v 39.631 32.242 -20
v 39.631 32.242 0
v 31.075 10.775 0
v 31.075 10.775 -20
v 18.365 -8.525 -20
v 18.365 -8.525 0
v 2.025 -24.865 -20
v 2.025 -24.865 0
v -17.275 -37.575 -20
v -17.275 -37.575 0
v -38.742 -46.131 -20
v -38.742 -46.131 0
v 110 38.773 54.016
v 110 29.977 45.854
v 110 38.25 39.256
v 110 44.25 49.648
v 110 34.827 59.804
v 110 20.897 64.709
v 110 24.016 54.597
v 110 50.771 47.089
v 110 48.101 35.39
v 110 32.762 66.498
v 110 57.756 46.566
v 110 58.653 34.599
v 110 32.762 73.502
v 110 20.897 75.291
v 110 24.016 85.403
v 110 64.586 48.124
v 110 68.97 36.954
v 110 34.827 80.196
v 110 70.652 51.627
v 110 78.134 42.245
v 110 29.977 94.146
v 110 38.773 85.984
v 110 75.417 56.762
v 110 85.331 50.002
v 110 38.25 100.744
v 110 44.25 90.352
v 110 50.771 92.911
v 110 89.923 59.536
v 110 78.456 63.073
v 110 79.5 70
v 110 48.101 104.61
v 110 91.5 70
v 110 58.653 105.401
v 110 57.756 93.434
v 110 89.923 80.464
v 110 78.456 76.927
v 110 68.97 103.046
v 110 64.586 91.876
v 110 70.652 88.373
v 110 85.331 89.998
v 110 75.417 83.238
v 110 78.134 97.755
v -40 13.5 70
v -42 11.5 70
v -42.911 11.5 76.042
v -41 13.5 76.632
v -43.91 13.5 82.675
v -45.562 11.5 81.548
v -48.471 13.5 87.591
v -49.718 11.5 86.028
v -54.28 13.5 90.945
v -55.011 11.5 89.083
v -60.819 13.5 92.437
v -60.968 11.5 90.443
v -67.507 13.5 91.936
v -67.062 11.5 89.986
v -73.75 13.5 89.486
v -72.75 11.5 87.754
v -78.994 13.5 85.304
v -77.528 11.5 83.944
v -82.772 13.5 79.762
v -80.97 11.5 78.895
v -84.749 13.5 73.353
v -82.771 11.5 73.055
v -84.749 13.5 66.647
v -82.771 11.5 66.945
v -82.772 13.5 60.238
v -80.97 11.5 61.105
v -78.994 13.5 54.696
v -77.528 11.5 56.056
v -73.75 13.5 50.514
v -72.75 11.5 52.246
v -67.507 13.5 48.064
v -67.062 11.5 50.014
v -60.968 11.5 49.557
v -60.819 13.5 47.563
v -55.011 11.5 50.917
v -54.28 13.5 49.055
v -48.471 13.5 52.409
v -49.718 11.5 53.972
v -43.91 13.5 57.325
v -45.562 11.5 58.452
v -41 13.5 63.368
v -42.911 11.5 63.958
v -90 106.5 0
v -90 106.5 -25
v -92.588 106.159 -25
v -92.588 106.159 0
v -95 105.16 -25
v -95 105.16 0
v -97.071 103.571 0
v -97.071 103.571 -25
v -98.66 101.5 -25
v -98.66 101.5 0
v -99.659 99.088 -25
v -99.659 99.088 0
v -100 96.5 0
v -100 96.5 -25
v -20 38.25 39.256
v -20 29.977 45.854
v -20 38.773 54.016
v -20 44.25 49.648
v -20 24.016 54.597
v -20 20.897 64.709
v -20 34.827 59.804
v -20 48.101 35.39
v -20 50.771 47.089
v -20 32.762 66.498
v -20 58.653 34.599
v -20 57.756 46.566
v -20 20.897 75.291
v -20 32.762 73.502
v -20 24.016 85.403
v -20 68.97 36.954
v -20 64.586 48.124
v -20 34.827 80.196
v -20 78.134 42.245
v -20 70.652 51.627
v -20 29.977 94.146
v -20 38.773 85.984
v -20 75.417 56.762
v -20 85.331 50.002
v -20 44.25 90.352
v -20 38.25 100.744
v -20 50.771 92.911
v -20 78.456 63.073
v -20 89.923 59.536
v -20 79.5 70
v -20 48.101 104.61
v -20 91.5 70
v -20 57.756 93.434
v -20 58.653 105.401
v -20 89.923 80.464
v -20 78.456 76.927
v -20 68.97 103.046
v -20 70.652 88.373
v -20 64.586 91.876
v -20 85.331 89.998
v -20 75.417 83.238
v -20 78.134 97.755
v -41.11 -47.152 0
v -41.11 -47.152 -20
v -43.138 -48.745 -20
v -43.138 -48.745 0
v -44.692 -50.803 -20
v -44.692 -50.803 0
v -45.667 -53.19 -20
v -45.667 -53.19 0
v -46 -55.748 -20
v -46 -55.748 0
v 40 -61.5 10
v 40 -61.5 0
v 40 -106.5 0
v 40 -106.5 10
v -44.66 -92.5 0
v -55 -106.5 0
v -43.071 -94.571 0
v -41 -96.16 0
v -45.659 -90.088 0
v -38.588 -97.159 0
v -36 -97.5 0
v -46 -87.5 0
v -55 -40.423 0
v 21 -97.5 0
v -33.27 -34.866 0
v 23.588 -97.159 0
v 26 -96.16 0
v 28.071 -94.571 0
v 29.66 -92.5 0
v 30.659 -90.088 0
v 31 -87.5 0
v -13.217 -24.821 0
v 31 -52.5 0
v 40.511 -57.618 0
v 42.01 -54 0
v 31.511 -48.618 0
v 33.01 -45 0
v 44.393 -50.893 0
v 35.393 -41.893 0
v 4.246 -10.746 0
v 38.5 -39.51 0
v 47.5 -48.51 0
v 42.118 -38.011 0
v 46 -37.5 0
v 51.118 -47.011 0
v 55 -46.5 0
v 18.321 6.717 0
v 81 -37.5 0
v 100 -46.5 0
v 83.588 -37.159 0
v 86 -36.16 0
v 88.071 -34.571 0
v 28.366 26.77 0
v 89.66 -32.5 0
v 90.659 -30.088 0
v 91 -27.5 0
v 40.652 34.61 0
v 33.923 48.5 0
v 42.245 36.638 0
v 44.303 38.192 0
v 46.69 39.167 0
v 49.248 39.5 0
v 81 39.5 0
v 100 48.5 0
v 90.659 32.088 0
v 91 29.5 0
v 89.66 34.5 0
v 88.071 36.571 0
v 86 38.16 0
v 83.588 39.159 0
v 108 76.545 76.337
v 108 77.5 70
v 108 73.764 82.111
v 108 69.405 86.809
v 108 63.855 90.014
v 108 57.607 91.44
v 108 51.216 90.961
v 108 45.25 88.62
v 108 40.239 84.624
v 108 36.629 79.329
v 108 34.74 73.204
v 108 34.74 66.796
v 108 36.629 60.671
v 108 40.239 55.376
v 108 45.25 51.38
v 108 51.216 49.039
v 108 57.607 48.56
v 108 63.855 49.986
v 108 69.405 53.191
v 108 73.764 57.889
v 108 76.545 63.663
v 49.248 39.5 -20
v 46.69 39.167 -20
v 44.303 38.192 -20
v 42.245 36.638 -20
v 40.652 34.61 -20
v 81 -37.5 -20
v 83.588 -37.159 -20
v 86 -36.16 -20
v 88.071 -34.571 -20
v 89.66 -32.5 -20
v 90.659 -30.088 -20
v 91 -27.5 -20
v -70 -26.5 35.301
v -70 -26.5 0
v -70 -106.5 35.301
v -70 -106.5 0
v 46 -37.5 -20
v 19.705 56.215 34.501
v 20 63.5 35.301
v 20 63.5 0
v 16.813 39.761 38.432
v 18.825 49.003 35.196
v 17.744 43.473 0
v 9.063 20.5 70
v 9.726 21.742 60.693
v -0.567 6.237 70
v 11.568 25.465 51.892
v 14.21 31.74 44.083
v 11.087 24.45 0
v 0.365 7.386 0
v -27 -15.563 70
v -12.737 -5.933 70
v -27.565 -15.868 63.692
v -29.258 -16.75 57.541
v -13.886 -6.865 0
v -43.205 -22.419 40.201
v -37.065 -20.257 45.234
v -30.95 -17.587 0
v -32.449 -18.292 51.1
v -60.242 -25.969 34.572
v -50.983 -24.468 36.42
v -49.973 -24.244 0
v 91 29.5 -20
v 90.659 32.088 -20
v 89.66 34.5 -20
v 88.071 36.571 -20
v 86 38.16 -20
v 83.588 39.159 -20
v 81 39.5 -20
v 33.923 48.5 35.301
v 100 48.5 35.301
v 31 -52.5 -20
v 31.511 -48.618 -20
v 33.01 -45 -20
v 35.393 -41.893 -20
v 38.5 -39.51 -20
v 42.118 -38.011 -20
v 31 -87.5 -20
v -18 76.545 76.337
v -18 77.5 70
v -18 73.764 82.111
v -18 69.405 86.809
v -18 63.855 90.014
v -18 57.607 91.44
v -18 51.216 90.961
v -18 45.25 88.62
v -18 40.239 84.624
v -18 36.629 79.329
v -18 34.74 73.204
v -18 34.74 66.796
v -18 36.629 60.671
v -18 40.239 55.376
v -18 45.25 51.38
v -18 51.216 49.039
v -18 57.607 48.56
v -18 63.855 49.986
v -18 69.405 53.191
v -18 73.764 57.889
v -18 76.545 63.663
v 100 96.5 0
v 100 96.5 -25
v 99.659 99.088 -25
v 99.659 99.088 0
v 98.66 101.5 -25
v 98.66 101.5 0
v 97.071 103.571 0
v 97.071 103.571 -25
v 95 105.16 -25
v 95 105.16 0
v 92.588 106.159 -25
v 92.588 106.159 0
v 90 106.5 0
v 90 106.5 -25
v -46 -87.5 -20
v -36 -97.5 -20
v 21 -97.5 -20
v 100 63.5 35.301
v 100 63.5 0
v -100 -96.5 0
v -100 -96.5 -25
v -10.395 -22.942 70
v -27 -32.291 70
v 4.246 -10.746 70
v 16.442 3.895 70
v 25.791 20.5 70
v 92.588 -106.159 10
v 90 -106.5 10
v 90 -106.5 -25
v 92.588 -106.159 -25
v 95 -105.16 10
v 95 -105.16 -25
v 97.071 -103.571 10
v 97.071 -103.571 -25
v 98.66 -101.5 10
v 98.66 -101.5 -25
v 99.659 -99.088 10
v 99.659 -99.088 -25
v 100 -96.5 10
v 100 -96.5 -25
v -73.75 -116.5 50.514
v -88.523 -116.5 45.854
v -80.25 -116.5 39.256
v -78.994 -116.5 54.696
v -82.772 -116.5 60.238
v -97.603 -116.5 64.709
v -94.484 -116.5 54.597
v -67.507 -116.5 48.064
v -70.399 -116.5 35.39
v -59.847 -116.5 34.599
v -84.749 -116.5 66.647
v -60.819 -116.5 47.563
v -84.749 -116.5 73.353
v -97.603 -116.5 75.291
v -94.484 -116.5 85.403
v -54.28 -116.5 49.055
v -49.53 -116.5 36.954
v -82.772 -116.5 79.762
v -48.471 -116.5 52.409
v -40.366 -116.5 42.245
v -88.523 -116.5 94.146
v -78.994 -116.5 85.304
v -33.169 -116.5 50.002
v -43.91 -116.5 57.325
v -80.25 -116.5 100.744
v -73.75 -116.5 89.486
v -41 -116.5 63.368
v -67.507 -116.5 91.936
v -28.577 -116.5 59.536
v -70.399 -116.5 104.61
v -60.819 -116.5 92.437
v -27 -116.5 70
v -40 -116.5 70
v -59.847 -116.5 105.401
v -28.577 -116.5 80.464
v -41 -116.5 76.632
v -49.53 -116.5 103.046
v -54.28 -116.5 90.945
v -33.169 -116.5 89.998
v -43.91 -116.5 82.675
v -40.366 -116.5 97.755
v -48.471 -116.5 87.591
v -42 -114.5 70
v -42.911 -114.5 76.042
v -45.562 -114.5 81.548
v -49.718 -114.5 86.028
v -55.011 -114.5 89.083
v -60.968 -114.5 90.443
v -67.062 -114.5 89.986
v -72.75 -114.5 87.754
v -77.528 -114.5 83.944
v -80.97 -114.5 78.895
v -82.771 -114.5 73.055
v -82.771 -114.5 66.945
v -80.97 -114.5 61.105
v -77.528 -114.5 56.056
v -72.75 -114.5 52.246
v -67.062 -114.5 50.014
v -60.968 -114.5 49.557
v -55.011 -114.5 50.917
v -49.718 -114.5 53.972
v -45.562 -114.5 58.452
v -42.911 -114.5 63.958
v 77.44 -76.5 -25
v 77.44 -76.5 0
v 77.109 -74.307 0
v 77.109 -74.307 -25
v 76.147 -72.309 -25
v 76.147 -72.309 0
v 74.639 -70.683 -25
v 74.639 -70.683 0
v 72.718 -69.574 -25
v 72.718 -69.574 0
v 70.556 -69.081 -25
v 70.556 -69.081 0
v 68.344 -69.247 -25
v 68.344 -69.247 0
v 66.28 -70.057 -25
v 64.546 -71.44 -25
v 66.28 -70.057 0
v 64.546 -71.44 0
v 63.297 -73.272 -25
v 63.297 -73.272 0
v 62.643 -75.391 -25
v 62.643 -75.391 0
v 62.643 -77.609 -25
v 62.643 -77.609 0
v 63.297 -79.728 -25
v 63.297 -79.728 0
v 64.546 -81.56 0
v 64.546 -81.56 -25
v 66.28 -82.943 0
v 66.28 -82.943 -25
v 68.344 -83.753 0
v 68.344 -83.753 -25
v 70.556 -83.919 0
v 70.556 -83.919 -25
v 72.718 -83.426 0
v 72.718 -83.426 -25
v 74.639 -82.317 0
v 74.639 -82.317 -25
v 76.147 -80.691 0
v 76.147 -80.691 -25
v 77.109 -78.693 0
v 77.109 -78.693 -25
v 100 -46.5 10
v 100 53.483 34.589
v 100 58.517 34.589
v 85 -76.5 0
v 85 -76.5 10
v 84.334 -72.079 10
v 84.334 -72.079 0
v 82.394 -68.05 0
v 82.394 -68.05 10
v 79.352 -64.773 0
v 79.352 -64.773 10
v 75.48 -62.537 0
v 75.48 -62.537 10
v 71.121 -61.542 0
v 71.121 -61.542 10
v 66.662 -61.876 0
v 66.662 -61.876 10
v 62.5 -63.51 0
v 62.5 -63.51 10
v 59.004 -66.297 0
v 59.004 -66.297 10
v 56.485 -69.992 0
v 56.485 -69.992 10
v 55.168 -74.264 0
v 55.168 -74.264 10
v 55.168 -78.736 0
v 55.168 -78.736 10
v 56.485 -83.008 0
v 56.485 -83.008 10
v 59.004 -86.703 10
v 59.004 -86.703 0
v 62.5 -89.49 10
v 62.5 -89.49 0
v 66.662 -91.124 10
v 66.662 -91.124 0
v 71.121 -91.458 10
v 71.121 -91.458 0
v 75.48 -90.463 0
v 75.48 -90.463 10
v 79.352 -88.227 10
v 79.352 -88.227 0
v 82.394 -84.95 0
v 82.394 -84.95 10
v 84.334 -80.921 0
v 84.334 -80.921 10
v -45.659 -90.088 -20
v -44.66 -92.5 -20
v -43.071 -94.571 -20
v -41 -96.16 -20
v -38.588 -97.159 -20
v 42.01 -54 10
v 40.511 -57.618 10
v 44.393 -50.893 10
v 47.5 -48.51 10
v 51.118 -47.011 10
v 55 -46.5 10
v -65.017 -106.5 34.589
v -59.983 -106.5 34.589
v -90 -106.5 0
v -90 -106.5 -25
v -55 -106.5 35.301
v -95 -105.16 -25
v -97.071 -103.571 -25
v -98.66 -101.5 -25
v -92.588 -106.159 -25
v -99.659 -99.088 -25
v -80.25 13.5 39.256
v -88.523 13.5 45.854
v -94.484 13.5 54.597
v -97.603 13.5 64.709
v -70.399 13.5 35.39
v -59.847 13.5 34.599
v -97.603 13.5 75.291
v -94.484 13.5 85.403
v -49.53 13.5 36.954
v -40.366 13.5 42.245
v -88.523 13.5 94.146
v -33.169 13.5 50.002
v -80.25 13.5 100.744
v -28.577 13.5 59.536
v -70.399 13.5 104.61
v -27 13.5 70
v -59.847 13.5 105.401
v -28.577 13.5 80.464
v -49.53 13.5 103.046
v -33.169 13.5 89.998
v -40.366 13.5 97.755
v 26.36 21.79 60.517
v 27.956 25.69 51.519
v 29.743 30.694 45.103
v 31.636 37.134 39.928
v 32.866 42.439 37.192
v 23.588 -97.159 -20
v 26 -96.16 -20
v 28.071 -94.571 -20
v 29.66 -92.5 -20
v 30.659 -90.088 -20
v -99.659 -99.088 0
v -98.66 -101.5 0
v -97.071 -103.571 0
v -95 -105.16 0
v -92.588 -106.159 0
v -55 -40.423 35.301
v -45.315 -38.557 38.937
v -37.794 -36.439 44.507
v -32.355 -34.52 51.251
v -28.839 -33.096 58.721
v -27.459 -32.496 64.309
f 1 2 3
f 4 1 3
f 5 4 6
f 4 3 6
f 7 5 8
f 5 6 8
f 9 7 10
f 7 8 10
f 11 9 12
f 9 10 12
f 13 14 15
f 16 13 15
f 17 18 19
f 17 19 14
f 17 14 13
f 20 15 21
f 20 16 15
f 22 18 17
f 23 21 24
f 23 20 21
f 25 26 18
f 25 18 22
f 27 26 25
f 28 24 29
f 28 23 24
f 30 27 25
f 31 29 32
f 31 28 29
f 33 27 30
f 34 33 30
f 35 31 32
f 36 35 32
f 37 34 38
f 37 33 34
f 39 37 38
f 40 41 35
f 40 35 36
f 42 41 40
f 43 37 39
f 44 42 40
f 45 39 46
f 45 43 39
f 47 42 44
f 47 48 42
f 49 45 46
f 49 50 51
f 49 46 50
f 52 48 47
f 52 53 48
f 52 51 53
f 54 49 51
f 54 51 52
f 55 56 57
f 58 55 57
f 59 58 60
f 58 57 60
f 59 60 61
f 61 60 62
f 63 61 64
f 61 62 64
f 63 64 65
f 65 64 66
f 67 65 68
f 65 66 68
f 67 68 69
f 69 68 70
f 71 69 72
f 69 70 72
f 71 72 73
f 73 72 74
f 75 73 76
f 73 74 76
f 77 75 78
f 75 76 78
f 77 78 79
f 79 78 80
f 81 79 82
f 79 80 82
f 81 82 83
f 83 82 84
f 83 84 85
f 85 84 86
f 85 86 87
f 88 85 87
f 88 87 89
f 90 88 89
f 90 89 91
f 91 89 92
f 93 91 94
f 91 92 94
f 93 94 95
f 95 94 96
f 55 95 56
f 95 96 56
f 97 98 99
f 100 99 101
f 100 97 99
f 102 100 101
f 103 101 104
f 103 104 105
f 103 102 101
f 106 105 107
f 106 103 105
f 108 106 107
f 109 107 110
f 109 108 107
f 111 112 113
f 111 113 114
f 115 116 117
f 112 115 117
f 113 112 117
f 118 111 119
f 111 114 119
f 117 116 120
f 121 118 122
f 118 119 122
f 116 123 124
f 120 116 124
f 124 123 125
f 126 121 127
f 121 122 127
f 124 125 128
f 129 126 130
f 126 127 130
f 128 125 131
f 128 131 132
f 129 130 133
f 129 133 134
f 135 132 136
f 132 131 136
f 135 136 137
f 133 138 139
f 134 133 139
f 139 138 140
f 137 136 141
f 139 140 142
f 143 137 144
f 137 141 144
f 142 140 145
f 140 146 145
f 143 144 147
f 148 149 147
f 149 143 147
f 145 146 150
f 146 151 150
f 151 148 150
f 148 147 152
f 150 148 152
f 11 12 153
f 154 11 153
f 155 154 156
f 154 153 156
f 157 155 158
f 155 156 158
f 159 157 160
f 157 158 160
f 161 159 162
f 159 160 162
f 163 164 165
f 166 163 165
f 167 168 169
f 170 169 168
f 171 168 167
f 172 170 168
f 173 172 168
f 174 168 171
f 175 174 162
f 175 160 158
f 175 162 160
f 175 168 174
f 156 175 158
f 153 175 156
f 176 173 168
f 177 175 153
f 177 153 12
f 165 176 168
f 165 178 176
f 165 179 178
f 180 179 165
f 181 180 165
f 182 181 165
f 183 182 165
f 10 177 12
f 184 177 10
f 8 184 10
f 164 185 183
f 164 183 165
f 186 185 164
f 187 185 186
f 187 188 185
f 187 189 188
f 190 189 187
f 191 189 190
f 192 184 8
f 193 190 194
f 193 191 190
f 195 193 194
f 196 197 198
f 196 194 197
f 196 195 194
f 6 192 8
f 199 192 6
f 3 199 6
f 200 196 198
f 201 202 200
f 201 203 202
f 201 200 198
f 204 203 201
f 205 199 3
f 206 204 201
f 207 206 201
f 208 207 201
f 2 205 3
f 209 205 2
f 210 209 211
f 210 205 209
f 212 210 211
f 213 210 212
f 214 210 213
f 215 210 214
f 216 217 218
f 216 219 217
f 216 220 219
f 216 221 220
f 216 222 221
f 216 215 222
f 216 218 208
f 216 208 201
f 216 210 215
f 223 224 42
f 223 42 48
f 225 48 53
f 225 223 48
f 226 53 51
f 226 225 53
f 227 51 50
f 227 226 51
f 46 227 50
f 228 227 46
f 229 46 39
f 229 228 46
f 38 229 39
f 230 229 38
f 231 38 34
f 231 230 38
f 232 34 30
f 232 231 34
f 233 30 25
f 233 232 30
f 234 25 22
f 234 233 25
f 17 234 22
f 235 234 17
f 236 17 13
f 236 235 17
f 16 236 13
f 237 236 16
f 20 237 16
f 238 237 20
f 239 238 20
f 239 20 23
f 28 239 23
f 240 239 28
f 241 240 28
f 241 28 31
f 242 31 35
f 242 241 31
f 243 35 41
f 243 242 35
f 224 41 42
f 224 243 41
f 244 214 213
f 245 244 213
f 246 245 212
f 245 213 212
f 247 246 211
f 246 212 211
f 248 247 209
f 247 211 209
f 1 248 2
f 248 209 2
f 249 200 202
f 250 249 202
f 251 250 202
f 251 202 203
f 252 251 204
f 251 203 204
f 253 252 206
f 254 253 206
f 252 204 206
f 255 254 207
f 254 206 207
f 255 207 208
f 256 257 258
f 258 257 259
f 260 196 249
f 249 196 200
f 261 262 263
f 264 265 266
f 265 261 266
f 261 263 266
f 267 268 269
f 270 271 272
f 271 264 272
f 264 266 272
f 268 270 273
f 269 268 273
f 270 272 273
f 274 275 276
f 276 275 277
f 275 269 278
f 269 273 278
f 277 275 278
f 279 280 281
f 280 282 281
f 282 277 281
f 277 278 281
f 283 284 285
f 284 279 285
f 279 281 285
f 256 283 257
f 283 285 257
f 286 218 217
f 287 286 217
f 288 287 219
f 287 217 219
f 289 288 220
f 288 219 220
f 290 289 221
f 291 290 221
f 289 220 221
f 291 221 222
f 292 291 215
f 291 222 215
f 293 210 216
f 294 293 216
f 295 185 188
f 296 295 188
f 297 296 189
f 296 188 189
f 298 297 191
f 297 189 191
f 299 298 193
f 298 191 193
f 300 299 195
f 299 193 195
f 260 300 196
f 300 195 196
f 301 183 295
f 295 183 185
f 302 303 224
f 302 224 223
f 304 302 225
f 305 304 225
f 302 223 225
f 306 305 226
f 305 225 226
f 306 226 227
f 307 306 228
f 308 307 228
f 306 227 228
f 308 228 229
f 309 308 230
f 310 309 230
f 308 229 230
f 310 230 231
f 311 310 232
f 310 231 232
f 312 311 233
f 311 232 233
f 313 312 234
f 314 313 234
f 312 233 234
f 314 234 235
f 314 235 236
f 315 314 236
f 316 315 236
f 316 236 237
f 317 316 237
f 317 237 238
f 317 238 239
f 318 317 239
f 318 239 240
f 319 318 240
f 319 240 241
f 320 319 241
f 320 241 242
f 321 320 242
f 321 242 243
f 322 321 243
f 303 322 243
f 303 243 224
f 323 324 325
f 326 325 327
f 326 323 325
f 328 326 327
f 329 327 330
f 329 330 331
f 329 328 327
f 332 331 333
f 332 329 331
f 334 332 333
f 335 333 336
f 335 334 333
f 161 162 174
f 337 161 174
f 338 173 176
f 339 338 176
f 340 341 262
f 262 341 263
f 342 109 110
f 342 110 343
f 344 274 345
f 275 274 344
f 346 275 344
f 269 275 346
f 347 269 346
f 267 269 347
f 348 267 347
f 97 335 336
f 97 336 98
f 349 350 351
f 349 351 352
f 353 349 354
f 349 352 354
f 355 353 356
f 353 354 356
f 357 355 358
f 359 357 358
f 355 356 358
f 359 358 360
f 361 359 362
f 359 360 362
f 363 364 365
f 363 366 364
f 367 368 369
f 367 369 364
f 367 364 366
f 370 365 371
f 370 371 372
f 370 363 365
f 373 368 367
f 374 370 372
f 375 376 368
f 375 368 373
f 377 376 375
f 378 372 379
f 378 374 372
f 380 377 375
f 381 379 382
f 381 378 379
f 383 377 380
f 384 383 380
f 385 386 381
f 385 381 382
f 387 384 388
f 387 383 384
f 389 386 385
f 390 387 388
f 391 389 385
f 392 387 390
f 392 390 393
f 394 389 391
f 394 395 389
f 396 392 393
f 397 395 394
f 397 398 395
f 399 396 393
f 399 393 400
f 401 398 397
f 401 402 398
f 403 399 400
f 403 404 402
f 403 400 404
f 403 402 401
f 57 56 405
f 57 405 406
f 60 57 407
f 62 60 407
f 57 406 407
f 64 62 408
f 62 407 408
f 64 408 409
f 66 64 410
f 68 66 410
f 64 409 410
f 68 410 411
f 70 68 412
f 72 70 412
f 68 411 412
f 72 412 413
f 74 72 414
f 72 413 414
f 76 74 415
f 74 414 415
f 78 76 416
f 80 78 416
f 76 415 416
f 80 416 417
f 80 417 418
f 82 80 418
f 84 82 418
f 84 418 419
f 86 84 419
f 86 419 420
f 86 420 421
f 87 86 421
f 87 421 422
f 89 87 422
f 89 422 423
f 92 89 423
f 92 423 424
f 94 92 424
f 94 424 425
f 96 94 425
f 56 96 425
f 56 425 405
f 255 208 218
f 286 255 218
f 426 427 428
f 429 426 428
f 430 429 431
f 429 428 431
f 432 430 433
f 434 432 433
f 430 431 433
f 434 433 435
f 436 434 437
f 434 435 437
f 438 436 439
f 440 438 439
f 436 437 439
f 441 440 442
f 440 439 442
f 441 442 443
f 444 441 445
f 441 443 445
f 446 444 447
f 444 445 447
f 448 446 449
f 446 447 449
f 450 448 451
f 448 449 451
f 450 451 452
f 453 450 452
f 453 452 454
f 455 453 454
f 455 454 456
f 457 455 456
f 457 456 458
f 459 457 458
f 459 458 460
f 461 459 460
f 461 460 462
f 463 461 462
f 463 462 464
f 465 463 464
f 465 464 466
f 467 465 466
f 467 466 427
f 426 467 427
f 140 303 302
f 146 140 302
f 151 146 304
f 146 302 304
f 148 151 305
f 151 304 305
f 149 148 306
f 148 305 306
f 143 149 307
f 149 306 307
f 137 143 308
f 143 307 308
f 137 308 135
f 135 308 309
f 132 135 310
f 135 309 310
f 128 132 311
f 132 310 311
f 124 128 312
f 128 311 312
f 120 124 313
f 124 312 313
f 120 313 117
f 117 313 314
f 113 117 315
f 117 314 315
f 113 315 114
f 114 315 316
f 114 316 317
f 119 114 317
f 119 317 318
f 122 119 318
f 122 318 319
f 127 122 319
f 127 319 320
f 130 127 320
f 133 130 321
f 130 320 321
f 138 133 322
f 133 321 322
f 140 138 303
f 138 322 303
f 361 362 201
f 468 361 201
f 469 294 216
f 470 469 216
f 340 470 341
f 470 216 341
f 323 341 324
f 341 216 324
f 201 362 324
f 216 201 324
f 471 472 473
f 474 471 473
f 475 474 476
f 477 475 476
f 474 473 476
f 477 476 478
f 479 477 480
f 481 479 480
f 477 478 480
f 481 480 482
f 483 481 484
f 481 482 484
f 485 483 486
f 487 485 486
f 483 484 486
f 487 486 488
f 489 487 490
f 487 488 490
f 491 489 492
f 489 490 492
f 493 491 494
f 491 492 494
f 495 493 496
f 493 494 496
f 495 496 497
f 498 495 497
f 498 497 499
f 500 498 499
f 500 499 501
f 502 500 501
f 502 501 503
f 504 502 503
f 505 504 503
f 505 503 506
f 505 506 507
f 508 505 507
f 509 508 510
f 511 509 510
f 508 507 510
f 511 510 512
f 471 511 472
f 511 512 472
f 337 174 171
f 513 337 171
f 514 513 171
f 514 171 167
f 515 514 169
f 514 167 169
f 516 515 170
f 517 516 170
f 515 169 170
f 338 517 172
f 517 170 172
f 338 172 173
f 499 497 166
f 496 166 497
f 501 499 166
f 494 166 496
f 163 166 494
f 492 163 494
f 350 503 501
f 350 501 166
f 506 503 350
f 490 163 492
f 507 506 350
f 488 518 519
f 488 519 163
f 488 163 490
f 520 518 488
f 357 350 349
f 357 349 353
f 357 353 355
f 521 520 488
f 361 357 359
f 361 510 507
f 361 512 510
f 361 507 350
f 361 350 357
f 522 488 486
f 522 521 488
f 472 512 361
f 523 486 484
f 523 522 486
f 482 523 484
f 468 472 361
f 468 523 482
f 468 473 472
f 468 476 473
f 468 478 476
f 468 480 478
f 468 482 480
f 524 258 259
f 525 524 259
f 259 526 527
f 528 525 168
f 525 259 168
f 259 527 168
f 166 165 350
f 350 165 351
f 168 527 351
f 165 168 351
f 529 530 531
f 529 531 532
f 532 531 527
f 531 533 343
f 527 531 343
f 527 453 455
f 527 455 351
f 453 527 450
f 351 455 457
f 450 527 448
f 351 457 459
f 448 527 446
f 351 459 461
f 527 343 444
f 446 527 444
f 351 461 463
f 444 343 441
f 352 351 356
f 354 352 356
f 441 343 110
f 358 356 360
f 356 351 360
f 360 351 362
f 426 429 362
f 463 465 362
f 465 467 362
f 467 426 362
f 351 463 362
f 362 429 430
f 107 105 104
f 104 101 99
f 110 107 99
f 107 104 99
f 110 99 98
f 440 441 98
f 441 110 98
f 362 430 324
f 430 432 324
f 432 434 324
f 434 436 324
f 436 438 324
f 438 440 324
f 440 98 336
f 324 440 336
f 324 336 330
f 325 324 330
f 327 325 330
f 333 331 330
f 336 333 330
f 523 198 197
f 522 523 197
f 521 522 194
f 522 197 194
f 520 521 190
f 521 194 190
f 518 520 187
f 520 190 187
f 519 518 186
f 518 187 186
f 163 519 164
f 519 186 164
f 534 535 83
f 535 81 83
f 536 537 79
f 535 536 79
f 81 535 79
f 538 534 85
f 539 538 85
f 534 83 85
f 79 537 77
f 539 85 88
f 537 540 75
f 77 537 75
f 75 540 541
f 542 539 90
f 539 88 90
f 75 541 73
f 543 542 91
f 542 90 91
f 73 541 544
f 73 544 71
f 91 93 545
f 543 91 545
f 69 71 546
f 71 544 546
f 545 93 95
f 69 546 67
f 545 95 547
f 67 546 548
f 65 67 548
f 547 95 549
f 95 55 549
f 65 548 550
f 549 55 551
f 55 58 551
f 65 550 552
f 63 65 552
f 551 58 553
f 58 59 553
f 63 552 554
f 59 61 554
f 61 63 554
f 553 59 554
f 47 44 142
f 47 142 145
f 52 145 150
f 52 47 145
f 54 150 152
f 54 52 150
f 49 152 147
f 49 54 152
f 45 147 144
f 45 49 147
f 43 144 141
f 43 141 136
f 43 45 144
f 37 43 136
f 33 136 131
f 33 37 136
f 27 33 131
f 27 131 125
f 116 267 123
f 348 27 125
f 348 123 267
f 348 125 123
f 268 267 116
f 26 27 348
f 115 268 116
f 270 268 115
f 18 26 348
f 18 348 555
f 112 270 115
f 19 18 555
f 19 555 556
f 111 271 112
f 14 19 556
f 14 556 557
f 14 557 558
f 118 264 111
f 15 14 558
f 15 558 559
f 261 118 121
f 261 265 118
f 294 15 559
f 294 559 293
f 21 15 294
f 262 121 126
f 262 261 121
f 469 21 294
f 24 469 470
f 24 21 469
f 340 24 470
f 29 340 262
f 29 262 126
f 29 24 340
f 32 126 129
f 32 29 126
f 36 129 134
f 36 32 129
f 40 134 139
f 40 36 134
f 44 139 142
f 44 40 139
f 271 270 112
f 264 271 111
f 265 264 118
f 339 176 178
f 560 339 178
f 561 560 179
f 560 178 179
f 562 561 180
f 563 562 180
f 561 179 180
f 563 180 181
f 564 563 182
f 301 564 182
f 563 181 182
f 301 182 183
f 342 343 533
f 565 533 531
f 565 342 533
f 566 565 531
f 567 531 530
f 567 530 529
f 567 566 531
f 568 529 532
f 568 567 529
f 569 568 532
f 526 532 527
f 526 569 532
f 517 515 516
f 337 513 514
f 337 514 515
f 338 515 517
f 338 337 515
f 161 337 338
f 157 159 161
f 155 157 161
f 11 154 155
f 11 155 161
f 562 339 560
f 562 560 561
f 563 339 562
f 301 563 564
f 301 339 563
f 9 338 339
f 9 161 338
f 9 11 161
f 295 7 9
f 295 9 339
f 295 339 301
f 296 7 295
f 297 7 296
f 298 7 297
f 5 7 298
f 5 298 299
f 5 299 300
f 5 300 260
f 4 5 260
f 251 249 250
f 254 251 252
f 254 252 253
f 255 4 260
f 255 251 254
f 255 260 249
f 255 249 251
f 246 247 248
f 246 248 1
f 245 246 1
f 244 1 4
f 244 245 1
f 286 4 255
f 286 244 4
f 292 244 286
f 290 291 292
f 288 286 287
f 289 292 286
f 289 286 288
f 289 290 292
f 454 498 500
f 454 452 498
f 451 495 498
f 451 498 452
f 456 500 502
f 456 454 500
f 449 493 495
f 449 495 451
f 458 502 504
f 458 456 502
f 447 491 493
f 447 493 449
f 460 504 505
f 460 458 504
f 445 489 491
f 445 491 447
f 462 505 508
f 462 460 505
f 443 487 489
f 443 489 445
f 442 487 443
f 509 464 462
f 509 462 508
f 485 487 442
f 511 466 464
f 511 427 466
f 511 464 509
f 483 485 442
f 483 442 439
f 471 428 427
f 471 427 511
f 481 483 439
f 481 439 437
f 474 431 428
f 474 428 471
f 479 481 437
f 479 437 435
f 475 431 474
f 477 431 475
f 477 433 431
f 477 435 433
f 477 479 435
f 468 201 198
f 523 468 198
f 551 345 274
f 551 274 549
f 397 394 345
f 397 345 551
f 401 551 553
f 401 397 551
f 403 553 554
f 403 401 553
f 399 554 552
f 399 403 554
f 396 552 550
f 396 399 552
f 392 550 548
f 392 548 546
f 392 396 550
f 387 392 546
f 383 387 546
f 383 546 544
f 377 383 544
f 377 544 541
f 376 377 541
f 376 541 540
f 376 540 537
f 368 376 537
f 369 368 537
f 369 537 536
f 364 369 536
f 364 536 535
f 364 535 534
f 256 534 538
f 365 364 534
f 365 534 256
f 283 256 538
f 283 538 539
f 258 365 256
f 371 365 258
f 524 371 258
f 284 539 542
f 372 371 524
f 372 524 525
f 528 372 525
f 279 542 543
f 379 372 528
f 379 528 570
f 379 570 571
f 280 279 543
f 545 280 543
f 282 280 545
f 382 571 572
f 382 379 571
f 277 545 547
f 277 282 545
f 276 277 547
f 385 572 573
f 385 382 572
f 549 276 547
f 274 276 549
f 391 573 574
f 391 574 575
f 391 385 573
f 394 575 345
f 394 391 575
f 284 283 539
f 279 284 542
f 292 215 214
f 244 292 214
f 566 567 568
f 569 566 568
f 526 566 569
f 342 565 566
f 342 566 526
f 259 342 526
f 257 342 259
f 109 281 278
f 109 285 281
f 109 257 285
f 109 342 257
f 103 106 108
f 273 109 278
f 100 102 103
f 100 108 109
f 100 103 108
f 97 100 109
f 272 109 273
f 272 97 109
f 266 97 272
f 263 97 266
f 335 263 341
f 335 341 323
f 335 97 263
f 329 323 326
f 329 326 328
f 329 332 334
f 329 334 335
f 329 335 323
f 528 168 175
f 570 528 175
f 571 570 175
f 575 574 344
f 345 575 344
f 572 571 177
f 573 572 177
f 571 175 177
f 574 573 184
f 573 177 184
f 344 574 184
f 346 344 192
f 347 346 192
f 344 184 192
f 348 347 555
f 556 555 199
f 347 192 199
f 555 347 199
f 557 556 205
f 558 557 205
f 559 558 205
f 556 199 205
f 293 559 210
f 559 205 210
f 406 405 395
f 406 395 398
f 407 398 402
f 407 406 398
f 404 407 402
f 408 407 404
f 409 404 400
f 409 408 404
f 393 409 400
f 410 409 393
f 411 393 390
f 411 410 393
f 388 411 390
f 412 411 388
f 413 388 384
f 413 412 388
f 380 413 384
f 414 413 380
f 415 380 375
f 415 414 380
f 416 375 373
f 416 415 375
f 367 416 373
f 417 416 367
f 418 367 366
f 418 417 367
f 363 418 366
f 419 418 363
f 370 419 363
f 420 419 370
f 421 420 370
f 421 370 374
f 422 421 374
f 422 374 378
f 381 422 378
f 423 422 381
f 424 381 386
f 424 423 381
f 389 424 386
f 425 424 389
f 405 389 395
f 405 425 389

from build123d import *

# Parameters (mm, degrees)
F1_DEPTH  = 25
F3_DEPTH  = 70
F5_DEPTH  = 10
F6_R      = 7.44
F7_DEPTH  = 35.001
F8_R      = 15
F9_DEPTH  = 10
F11_DEPTH = 20
F13_R     = 35.5
F14_DEPTH = 130
F15_R     = 21.5
F16_DEPTH = 210.001
F18_R     = 35.5
F19_DEPTH = 130
F20_R     = 20.5
F21_DEPTH = 223.001
F22_SIZE  = 2


with BuildPart() as f1:
    # F0 (on Top) → F1 (new body)
    with BuildSketch(Plane.XY):
        with BuildLine():
            Line((90, 106.5), (-90, 106.5))
            ThreePointArc((-90, 106.5), (-97.0710678119, 103.5710678119), (-100, 96.5))
            Line((-100, 96.5), (-100, -96.5))
            ThreePointArc((-100, -96.5), (-97.0710678119, -103.5710678119), (-90, -106.5))
            Line((-90, -106.5), (90, -106.5))
            ThreePointArc((90, -106.5), (97.0710678119, -103.5710678119), (100, -96.5))
            Line((100, -96.5), (100, 96.5))
            ThreePointArc((100, 96.5), (97.0710678119, 103.5710678119), (90, 106.5))
        make_face()
    extrude(amount=-F1_DEPTH)

    # F2 (on face) → F3 (join)
    with BuildSketch(Plane.XY):
        with BuildLine():
            Line((-70, -26.5), (-70, -106.5))
            Line((-70, -106.5), (-55, -106.5))
            Line((-55, -106.5), (-55, -40.4230484541))
            ThreePointArc((-55, -40.4230484541), (4.2462120246, -10.7462120246), (33.9230484541, 48.5))
            Line((33.9230484541, 48.5), (100, 48.5))
            Line((100, 48.5), (100, 63.5))
            Line((100, 63.5), (20, 63.5))
            ThreePointArc((20, 63.5), (-6.3603896932, -0.1396103068), (-70, -26.5))
        make_face()
    extrude(amount=F3_DEPTH)

    # F4 (on face) → F5 (join)
    with BuildSketch(Plane.XY):
        with BuildLine():
            Line((100, -96.5), (100, -46.5))
            Line((100, -46.5), (55, -46.5))
            ThreePointArc((55, -46.5), (44.3933982822, -50.8933982822), (40, -61.5))
            Line((40, -61.5), (40, -106.5))
            Line((40, -106.5), (90, -106.5))
            ThreePointArc((90, -106.5), (97.0710678119, -103.5710678119), (100, -96.5))
        make_face()
    extrude(amount=F5_DEPTH)

    # F6 (on face) → F7 (cut, through all)
    with BuildSketch(Plane.XY.offset(10)):
        with Locations((70, -76.5)):
            Circle(F6_R)
    extrude(amount=-F7_DEPTH, mode=Mode.SUBTRACT)

    # F8 (on face) → F9 (cut)
    with BuildSketch(Plane.XY.offset(10)):
        with Locations((70, -76.5)):
            Circle(F8_R)
    extrude(amount=-F9_DEPTH, mode=Mode.SUBTRACT)

    # F10 (on face) → F11 (cut)
    with BuildSketch(Plane.XY):
        with BuildLine():
            ThreePointArc((91, 29.5), (88.0710678119, 36.5710678119), (81, 39.5))
            Line((81, 39.5), (49.2476414861, 39.5))
            ThreePointArc((49.2476414861, 39.5), (43.2234965193, 37.481834214), (39.630896205, 32.2419354839))
            ThreePointArc((39.630896205, 32.2419354839), (10.6101730553, -17.1101730553), (-38.7419354839, -46.130896205))
            ThreePointArc((-38.7419354839, -46.130896205), (-43.981834214, -49.7234965193), (-46, -55.7476414861))
            Line((-46, -55.7476414861), (-46, -87.5))
            ThreePointArc((-46, -87.5), (-43.0710678119, -94.5710678119), (-36, -97.5))
            Line((-36, -97.5), (21, -97.5))
            ThreePointArc((21, -97.5), (28.0710678119, -94.5710678119), (31, -87.5))
            Line((31, -87.5), (31, -52.5))
            ThreePointArc((31, -52.5), (35.3933982822, -41.8933982822), (46, -37.5))
            Line((46, -37.5), (81, -37.5))
            ThreePointArc((81, -37.5), (88.0710678119, -34.5710678119), (91, -27.5))
            Line((91, -27.5), (91, 29.5))
        make_face()
    extrude(amount=-F11_DEPTH, mode=Mode.SUBTRACT)

    # F13 (on offset) → F14 (join)
    with BuildSketch(Plane.YZ.offset(110)):
        with Locations((56, 70)):
            Circle(F13_R)
    extrude(amount=-F14_DEPTH)

    # F15 (on face) → F16 (cut, through all)
    with BuildSketch(Plane.YZ.offset(110)):
        with Locations((56, 70)):
            Circle(F15_R)
    extrude(amount=-F16_DEPTH, mode=Mode.SUBTRACT)

    # F18 (on offset) → F19 (join)
    with BuildSketch(Plane.XZ.offset(116.5)):
        with Locations((-62.5, 70)):
            Circle(F18_R)
    extrude(amount=-F19_DEPTH)

    # F20 (on face) → F21 (cut, through all)
    with BuildSketch(Plane.XZ.offset(116.5)):
        with Locations((-62.5, 70)):
            Circle(F20_R)
    extrude(amount=-F21_DEPTH, mode=Mode.SUBTRACT)

    # F22
    f22_edges = [f1.edges().sort_by_distance(p)[0] for p in [
        (-83, -116.5, 70),
        (-83, 13.5, 70),
        (-20, 34.5, 70),
        (110, 34.5, 70),
    ]]
    chamfer(f22_edges, length=F22_SIZE)


solid = f1.part
